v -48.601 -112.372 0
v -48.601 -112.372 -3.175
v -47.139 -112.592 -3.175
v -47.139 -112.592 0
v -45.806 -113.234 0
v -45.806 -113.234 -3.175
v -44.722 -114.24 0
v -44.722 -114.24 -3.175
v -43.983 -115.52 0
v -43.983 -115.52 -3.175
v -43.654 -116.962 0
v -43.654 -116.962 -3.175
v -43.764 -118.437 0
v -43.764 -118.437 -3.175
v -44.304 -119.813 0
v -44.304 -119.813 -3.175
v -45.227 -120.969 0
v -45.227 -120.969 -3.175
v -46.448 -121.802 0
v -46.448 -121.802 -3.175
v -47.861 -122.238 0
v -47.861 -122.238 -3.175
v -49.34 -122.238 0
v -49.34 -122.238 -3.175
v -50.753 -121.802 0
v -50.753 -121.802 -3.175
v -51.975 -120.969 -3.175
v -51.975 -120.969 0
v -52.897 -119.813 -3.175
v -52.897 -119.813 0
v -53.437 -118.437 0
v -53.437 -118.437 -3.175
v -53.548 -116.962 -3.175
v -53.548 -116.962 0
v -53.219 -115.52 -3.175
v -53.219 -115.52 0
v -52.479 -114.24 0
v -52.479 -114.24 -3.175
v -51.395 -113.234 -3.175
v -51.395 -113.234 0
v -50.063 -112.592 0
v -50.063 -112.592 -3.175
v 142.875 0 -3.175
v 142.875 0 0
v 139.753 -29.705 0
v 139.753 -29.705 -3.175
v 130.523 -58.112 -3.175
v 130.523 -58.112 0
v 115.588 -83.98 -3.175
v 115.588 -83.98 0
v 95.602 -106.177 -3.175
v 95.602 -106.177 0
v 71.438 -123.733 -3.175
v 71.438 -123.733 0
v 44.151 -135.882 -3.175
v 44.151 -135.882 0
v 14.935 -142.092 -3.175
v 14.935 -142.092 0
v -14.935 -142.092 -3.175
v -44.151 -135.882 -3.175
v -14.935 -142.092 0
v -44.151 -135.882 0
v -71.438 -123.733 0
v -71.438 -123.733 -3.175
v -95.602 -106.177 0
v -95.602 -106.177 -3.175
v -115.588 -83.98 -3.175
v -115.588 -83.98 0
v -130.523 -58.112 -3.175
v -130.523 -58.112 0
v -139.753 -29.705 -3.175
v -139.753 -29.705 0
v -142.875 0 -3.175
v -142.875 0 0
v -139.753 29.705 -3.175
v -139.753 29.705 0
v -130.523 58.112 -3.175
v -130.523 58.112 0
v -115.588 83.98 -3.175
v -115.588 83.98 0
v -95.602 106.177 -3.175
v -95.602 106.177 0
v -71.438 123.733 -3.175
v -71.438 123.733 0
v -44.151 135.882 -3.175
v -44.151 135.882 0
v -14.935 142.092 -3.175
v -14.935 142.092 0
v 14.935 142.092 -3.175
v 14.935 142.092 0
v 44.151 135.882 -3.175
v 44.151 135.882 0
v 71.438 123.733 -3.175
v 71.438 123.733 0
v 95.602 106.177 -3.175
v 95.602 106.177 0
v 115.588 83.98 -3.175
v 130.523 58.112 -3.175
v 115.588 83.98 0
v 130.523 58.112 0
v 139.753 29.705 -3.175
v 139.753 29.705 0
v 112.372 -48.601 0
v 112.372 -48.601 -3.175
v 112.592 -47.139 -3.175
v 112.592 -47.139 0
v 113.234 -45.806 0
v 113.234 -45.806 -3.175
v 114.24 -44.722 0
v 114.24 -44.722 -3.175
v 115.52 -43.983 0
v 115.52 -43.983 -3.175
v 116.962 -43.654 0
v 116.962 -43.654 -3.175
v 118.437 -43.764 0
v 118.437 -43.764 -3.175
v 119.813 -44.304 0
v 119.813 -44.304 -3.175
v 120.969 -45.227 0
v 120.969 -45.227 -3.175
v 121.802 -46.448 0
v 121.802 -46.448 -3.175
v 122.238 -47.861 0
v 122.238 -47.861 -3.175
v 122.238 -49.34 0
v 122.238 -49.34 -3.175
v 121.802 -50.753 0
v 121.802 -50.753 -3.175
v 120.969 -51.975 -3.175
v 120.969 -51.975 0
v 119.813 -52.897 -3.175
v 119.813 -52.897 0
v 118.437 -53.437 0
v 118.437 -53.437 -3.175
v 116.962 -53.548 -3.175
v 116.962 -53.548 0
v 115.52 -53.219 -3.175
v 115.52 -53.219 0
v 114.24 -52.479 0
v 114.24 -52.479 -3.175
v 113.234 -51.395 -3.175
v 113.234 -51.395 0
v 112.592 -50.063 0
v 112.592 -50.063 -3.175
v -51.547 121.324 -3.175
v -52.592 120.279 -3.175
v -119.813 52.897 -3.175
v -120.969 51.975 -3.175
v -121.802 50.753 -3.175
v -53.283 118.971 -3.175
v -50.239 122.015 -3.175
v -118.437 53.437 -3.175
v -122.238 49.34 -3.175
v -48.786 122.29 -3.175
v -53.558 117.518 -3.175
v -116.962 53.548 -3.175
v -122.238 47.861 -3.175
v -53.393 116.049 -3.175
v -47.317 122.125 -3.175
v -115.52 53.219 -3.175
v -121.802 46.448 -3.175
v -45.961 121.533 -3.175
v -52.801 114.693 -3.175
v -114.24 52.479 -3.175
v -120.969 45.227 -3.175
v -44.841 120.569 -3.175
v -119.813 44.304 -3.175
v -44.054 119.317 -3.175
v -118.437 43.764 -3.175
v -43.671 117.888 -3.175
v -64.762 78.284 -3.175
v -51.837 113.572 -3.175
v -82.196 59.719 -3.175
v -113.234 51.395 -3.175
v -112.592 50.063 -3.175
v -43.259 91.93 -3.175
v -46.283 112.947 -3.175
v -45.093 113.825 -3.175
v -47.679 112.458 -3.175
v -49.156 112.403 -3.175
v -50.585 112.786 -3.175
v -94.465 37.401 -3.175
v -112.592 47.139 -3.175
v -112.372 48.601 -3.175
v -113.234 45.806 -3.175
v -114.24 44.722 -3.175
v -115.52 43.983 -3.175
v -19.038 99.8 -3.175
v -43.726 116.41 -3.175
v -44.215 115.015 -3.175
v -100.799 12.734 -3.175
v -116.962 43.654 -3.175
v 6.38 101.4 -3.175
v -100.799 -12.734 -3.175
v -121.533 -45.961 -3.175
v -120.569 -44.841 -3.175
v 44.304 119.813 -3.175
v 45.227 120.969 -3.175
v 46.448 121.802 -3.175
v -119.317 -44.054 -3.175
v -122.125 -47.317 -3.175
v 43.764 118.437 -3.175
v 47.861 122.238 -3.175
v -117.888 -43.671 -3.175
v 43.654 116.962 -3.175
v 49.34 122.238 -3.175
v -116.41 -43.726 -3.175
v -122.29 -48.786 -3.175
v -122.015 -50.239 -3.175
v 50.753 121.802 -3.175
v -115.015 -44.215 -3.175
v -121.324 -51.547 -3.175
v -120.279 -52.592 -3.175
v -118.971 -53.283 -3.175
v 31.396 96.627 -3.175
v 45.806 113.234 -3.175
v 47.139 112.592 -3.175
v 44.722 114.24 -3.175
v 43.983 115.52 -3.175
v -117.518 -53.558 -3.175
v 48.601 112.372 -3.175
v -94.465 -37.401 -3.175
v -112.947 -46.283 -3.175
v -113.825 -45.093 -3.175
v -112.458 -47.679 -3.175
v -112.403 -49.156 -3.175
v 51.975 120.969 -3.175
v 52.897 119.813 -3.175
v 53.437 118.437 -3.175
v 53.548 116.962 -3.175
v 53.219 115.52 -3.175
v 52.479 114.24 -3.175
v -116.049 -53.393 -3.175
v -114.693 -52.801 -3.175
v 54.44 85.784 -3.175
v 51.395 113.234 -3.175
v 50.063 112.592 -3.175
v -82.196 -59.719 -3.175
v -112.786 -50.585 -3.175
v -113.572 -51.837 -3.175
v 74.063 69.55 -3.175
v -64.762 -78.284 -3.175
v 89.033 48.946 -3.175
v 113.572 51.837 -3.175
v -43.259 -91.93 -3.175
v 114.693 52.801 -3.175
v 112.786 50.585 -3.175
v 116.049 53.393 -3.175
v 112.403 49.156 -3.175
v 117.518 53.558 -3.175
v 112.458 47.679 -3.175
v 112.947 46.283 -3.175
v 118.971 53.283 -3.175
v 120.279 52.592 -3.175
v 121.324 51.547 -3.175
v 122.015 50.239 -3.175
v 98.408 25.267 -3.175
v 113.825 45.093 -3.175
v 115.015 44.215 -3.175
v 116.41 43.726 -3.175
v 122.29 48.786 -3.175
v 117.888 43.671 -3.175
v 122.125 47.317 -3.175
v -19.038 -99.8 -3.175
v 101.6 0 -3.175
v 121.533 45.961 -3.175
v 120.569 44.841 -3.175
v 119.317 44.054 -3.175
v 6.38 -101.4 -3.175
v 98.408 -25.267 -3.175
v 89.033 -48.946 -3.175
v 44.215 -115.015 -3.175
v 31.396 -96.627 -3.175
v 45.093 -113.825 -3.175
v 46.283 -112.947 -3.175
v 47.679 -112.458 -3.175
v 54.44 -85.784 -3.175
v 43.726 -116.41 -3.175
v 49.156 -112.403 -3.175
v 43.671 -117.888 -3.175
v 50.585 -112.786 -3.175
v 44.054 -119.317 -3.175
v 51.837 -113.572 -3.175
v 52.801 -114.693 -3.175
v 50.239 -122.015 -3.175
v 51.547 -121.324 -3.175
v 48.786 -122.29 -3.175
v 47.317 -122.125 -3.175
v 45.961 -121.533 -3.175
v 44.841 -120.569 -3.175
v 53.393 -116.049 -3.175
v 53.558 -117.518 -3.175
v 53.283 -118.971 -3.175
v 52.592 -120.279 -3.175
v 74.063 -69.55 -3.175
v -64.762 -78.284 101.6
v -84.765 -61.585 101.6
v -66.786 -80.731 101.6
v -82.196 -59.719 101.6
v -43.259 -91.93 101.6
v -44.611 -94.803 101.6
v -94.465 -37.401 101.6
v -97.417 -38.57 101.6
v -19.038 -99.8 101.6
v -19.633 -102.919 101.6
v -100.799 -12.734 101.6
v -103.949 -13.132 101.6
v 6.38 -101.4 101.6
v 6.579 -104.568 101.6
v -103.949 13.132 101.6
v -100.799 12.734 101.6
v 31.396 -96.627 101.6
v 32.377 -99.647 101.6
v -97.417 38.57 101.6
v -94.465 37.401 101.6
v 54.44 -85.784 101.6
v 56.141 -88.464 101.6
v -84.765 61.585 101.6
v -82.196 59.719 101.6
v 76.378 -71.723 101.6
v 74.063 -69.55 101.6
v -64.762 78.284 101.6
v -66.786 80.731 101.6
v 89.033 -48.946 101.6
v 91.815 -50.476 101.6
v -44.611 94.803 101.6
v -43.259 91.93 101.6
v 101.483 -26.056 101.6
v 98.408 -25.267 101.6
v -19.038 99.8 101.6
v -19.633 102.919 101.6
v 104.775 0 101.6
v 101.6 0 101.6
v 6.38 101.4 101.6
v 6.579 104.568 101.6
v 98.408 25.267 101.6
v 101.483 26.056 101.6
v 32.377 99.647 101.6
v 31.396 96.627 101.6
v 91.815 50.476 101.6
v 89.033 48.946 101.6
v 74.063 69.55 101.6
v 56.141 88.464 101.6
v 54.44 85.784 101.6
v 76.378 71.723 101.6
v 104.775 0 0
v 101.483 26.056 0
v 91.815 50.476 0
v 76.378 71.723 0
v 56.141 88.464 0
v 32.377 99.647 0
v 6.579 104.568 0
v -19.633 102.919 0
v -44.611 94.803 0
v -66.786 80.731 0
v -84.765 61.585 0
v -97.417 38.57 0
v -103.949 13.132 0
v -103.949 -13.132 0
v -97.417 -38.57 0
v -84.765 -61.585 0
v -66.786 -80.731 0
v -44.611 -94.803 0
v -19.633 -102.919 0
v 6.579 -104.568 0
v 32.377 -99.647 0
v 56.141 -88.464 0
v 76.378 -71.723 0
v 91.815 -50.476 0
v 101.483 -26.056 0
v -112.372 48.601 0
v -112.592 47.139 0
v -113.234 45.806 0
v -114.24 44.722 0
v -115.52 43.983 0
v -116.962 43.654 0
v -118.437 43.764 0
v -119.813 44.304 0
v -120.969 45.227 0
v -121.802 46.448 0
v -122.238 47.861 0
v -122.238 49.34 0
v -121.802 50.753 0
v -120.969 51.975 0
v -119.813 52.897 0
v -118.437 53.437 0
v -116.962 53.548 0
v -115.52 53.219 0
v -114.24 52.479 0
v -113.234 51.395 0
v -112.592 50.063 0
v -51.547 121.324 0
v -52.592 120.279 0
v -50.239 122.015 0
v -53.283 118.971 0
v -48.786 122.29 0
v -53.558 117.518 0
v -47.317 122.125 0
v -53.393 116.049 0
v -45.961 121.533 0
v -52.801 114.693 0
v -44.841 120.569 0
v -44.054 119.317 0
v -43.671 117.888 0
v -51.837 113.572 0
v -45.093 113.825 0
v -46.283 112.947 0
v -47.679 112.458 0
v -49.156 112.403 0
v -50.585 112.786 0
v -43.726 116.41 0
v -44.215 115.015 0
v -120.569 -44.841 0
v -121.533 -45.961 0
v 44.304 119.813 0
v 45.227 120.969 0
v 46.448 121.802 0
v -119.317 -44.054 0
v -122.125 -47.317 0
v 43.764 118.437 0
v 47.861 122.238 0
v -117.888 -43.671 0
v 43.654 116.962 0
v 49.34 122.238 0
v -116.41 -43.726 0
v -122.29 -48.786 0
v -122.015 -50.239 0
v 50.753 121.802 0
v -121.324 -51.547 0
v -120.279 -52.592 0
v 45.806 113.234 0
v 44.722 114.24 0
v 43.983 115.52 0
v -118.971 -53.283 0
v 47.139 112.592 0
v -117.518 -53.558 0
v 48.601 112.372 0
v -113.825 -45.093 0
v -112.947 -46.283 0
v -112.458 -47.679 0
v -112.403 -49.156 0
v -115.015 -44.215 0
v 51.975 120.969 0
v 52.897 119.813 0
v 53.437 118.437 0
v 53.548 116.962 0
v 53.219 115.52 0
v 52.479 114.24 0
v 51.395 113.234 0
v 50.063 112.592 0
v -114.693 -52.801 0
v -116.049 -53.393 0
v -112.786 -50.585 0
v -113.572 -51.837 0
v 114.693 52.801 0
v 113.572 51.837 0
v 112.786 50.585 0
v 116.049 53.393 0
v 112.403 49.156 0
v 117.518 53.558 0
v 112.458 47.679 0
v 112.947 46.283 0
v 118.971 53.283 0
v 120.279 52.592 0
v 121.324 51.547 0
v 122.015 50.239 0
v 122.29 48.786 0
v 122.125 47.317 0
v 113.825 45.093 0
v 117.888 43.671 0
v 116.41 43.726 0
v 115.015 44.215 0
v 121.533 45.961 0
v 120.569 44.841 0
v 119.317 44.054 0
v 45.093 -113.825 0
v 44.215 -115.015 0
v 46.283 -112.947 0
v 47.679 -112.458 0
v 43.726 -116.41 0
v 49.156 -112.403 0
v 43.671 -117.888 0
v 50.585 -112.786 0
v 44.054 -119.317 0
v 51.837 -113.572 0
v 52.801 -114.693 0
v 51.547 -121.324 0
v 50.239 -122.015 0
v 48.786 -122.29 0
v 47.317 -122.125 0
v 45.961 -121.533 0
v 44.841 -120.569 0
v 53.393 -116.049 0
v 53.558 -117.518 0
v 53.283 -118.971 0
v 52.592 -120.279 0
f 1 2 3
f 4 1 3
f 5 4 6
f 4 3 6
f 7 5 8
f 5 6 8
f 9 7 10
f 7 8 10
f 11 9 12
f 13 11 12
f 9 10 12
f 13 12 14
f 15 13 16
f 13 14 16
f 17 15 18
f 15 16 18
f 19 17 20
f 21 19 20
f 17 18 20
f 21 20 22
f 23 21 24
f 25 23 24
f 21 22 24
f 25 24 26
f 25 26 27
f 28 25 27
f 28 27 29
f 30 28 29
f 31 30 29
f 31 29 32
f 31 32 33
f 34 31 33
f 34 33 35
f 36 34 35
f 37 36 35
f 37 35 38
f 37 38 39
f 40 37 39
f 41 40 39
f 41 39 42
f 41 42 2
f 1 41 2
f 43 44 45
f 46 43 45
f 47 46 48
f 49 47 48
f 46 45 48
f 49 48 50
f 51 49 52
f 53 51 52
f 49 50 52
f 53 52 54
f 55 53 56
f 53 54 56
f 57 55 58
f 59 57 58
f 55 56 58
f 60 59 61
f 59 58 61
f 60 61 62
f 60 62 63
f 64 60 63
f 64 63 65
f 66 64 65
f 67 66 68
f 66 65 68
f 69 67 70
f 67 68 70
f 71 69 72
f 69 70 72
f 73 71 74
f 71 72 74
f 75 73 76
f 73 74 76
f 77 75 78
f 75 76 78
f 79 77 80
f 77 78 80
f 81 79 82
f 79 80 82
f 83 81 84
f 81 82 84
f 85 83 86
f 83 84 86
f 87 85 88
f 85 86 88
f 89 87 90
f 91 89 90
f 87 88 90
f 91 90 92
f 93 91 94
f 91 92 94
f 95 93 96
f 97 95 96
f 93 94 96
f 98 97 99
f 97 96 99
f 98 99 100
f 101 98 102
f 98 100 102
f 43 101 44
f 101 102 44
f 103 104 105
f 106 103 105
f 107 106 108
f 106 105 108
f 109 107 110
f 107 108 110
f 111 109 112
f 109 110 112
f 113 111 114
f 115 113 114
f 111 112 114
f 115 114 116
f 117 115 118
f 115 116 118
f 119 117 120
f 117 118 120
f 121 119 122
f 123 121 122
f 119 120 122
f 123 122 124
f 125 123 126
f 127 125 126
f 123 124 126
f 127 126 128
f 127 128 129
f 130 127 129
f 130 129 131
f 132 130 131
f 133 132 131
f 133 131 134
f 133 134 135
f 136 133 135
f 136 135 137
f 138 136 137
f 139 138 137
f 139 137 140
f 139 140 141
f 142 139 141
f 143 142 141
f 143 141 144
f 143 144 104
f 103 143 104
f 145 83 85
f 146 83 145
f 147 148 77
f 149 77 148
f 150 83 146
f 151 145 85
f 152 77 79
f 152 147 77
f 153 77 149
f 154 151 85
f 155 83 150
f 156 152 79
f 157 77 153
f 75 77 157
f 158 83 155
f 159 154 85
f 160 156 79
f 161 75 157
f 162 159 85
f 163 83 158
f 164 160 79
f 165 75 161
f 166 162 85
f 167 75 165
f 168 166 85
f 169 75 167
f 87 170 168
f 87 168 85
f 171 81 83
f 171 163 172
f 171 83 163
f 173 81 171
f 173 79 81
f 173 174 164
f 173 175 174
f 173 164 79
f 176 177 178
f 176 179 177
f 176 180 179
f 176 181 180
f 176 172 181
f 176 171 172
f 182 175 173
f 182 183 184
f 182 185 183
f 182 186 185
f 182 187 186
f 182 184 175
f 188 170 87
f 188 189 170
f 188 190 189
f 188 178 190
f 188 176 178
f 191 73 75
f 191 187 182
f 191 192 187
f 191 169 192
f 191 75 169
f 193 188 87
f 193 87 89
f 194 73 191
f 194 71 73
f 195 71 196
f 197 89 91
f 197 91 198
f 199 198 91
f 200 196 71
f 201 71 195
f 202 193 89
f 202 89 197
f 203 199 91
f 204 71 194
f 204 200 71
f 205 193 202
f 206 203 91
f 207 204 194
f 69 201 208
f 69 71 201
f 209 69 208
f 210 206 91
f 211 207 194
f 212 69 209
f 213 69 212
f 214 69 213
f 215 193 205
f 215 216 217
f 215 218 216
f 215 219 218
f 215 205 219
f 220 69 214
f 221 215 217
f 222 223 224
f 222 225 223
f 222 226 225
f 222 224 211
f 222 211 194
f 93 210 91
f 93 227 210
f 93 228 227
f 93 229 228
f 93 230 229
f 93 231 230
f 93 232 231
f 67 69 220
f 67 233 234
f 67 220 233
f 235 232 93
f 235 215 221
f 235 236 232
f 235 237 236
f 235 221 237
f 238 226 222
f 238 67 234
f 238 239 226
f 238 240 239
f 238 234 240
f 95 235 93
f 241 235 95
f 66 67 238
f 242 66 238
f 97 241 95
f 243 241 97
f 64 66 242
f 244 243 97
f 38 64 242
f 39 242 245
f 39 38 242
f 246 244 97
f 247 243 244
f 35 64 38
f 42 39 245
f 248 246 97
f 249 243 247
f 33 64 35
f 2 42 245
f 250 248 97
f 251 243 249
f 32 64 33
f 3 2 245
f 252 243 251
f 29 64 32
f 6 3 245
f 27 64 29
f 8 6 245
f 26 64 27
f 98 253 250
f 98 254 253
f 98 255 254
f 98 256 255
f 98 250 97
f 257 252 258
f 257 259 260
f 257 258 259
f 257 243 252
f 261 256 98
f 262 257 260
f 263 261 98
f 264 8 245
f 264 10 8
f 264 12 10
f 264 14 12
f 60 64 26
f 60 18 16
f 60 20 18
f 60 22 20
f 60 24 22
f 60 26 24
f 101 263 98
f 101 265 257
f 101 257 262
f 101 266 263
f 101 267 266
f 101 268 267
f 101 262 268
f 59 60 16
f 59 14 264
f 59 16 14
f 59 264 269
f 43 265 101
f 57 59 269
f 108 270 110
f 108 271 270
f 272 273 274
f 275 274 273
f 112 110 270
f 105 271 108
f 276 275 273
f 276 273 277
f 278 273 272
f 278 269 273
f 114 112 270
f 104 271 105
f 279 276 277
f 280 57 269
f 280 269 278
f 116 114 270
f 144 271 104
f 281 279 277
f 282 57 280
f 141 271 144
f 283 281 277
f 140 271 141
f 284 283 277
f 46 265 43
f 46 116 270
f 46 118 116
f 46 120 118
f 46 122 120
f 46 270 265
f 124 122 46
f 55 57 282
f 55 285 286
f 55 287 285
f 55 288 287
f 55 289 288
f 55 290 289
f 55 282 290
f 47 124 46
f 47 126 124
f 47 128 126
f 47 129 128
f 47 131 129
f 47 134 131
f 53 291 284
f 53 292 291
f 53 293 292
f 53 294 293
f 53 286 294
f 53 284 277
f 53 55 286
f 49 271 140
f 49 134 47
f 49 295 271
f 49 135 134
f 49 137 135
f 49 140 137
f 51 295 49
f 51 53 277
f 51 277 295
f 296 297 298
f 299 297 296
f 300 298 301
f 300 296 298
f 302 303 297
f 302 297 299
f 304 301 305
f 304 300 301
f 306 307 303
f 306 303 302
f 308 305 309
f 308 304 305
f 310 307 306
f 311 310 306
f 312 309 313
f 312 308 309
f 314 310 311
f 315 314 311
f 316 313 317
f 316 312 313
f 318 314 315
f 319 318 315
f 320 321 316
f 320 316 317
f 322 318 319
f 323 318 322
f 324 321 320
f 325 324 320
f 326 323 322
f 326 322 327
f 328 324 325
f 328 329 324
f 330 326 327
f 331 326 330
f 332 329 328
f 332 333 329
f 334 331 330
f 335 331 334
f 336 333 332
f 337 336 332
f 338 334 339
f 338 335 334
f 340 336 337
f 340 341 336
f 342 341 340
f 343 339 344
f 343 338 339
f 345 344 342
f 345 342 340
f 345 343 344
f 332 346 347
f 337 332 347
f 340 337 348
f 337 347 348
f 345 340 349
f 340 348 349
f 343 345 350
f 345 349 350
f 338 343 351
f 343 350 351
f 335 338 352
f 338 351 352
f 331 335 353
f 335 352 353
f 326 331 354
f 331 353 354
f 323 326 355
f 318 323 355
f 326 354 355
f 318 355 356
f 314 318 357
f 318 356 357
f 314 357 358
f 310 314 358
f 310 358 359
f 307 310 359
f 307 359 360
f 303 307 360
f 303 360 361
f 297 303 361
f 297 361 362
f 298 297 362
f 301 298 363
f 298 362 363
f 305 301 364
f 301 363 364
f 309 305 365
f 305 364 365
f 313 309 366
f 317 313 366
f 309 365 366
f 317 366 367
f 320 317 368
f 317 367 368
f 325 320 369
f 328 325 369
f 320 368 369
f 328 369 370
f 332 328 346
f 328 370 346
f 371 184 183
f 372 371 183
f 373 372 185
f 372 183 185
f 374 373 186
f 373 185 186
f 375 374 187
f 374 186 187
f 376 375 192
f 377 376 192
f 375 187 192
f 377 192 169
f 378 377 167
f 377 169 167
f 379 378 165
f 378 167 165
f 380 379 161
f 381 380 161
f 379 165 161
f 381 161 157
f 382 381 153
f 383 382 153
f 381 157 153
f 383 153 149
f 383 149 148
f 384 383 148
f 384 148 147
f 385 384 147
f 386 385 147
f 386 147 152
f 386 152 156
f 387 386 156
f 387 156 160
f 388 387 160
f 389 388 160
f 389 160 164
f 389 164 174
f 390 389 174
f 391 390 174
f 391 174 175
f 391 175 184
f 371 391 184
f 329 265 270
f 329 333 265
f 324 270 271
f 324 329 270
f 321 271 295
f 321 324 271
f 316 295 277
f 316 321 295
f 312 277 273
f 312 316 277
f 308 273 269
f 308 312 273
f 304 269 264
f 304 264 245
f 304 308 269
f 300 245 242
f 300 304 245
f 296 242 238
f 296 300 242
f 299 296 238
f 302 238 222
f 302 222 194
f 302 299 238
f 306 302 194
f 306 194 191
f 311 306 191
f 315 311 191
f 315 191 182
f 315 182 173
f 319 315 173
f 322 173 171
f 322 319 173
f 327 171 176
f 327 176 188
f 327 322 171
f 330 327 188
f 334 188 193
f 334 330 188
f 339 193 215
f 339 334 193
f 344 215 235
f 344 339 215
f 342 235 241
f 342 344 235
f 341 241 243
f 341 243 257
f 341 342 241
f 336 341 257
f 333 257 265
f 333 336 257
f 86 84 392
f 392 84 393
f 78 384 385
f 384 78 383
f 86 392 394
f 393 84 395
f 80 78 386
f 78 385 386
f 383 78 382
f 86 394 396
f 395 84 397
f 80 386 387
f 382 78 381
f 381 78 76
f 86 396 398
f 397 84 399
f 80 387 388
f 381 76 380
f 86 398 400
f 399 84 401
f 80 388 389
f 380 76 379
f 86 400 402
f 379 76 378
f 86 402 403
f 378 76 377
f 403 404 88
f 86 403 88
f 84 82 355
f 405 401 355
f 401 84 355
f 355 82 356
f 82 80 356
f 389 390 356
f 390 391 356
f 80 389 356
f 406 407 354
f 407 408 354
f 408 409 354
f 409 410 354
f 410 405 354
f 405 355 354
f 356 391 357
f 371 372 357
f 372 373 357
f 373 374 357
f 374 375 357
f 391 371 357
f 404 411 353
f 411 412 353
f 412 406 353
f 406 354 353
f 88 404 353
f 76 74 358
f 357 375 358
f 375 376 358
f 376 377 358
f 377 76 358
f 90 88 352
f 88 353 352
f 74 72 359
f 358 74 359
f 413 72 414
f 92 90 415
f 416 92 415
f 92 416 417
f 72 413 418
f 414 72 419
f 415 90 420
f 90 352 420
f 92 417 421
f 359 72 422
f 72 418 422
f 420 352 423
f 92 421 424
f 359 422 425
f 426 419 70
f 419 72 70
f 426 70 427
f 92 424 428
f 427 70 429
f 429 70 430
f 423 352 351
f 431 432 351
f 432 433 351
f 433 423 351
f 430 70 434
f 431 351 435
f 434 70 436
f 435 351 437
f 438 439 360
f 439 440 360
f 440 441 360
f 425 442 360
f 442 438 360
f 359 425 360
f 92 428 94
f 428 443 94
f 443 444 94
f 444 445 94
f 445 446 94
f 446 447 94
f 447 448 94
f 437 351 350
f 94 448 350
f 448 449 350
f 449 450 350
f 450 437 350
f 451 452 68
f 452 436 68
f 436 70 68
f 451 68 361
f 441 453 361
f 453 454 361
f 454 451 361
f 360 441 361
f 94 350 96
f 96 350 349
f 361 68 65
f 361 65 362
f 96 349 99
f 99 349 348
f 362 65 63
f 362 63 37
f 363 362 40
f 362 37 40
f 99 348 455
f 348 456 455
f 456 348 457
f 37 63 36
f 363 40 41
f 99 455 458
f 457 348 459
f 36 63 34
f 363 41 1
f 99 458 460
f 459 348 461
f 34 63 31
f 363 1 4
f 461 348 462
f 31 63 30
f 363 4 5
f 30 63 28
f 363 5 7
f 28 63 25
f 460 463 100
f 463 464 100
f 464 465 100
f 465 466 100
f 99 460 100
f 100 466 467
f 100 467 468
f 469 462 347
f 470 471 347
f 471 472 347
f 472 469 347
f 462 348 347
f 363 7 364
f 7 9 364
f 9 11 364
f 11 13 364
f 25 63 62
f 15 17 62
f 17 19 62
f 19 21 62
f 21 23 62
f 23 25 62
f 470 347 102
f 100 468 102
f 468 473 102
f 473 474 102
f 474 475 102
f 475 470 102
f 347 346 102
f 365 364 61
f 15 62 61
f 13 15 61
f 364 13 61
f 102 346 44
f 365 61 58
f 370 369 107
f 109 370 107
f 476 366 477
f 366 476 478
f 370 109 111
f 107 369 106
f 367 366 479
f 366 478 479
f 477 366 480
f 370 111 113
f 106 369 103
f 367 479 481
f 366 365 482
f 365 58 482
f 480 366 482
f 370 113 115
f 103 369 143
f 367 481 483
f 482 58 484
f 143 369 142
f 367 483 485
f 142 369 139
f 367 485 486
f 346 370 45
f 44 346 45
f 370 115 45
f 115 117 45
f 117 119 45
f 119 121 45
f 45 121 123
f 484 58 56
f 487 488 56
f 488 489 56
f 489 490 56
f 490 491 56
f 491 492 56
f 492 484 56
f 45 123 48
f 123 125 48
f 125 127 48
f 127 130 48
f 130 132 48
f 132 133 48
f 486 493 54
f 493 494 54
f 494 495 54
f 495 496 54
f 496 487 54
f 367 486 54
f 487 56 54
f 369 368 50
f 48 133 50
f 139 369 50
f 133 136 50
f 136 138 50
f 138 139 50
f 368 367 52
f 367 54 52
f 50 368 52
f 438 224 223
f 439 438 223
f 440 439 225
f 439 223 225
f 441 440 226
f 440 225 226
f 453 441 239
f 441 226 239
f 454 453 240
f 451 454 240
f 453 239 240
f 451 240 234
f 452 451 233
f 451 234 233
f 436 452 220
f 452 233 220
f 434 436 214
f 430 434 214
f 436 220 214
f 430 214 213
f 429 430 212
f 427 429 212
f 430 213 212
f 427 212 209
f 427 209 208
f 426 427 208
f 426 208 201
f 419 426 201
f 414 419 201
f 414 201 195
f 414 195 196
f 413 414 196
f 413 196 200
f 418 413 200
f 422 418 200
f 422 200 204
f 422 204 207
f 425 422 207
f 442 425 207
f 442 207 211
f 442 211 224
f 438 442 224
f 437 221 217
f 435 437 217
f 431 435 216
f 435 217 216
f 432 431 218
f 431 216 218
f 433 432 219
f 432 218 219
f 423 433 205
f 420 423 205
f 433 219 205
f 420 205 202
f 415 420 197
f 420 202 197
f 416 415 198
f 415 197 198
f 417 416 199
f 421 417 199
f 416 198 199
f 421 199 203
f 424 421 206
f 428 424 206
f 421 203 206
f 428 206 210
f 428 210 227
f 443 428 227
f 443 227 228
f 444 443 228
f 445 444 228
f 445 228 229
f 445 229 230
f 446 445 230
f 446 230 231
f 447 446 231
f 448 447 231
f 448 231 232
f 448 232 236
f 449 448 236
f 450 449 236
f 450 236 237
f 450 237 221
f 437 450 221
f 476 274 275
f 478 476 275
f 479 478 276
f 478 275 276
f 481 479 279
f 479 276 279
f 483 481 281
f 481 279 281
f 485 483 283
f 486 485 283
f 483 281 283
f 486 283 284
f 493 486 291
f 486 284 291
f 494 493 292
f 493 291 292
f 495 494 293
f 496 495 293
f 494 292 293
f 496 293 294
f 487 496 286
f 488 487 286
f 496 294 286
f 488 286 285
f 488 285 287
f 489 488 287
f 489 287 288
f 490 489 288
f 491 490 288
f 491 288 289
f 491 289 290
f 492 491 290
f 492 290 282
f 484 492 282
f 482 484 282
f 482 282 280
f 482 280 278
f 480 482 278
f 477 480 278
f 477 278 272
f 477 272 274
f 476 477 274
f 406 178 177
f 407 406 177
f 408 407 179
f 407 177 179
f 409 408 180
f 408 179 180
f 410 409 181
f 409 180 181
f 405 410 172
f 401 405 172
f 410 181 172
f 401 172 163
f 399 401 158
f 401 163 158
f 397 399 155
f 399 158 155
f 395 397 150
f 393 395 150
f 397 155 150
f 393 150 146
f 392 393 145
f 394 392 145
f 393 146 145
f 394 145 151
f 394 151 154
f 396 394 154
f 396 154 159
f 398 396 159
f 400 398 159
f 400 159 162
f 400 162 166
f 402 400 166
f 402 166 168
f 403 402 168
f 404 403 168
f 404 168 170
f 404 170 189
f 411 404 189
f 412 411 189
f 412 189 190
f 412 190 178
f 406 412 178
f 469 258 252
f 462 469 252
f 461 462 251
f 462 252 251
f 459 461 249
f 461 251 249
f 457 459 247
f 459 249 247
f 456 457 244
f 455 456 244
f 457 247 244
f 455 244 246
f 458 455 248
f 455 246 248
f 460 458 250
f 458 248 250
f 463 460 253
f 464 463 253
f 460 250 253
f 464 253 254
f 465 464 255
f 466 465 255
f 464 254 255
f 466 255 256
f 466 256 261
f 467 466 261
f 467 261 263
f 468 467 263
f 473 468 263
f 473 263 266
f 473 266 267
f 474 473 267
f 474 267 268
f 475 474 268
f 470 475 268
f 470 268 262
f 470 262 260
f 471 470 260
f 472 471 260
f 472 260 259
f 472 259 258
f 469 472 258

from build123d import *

# Parameters (mm, degrees)
F0_R            = 104.775
F0_R_2          = 101.6
F1_DEPTH        = 101.6
F2_R            = 142.875
F2_R_2          = 101.6
F3_DEPTH        = 3.175
F5_D            = 9.921875
F5_COPIES_COUNT = 8


# Not quite as in the source:
# - a length typed as a fraction of an inch, garbled in the dataset ("3 / 203.2 mm" for 3/8 in), is restored
# - a pattern or mirror of a feature is missing from the dataset's text; its kind, count and spacing are read off the source's solid


with BuildPart() as f1:
    # F0 (on Top) → F1 (new body)
    with BuildSketch(Plane.XY):
        Circle(F0_R)
        Circle(F0_R_2, mode=Mode.SUBTRACT)
    extrude(amount=F1_DEPTH)

    # F2 (on face) → F3 (join)
    with BuildSketch(Plane(origin=(0, 0, 0), x_dir=(1, 0, 0), z_dir=(0, 0, -1))):
        Circle(F2_R)
        Circle(F2_R_2, mode=Mode.SUBTRACT)
    extrude(amount=F3_DEPTH)

    # F5 (through all)
    with Locations(Plane.XY):
        with Locations((117.3327006289, -48.6007959104)):
            f5 = Hole(F5_D / 2)

    # F5_copies: F5 ×8 about axis
    f5_copies_axis = Axis((0, 0, 0), (0, 0, 1))
    for i in range(1, F5_COPIES_COUNT):
        add(f5.rotate(f5_copies_axis, i * 360 / F5_COPIES_COUNT), mode=Mode.SUBTRACT)


solid = f1.part
